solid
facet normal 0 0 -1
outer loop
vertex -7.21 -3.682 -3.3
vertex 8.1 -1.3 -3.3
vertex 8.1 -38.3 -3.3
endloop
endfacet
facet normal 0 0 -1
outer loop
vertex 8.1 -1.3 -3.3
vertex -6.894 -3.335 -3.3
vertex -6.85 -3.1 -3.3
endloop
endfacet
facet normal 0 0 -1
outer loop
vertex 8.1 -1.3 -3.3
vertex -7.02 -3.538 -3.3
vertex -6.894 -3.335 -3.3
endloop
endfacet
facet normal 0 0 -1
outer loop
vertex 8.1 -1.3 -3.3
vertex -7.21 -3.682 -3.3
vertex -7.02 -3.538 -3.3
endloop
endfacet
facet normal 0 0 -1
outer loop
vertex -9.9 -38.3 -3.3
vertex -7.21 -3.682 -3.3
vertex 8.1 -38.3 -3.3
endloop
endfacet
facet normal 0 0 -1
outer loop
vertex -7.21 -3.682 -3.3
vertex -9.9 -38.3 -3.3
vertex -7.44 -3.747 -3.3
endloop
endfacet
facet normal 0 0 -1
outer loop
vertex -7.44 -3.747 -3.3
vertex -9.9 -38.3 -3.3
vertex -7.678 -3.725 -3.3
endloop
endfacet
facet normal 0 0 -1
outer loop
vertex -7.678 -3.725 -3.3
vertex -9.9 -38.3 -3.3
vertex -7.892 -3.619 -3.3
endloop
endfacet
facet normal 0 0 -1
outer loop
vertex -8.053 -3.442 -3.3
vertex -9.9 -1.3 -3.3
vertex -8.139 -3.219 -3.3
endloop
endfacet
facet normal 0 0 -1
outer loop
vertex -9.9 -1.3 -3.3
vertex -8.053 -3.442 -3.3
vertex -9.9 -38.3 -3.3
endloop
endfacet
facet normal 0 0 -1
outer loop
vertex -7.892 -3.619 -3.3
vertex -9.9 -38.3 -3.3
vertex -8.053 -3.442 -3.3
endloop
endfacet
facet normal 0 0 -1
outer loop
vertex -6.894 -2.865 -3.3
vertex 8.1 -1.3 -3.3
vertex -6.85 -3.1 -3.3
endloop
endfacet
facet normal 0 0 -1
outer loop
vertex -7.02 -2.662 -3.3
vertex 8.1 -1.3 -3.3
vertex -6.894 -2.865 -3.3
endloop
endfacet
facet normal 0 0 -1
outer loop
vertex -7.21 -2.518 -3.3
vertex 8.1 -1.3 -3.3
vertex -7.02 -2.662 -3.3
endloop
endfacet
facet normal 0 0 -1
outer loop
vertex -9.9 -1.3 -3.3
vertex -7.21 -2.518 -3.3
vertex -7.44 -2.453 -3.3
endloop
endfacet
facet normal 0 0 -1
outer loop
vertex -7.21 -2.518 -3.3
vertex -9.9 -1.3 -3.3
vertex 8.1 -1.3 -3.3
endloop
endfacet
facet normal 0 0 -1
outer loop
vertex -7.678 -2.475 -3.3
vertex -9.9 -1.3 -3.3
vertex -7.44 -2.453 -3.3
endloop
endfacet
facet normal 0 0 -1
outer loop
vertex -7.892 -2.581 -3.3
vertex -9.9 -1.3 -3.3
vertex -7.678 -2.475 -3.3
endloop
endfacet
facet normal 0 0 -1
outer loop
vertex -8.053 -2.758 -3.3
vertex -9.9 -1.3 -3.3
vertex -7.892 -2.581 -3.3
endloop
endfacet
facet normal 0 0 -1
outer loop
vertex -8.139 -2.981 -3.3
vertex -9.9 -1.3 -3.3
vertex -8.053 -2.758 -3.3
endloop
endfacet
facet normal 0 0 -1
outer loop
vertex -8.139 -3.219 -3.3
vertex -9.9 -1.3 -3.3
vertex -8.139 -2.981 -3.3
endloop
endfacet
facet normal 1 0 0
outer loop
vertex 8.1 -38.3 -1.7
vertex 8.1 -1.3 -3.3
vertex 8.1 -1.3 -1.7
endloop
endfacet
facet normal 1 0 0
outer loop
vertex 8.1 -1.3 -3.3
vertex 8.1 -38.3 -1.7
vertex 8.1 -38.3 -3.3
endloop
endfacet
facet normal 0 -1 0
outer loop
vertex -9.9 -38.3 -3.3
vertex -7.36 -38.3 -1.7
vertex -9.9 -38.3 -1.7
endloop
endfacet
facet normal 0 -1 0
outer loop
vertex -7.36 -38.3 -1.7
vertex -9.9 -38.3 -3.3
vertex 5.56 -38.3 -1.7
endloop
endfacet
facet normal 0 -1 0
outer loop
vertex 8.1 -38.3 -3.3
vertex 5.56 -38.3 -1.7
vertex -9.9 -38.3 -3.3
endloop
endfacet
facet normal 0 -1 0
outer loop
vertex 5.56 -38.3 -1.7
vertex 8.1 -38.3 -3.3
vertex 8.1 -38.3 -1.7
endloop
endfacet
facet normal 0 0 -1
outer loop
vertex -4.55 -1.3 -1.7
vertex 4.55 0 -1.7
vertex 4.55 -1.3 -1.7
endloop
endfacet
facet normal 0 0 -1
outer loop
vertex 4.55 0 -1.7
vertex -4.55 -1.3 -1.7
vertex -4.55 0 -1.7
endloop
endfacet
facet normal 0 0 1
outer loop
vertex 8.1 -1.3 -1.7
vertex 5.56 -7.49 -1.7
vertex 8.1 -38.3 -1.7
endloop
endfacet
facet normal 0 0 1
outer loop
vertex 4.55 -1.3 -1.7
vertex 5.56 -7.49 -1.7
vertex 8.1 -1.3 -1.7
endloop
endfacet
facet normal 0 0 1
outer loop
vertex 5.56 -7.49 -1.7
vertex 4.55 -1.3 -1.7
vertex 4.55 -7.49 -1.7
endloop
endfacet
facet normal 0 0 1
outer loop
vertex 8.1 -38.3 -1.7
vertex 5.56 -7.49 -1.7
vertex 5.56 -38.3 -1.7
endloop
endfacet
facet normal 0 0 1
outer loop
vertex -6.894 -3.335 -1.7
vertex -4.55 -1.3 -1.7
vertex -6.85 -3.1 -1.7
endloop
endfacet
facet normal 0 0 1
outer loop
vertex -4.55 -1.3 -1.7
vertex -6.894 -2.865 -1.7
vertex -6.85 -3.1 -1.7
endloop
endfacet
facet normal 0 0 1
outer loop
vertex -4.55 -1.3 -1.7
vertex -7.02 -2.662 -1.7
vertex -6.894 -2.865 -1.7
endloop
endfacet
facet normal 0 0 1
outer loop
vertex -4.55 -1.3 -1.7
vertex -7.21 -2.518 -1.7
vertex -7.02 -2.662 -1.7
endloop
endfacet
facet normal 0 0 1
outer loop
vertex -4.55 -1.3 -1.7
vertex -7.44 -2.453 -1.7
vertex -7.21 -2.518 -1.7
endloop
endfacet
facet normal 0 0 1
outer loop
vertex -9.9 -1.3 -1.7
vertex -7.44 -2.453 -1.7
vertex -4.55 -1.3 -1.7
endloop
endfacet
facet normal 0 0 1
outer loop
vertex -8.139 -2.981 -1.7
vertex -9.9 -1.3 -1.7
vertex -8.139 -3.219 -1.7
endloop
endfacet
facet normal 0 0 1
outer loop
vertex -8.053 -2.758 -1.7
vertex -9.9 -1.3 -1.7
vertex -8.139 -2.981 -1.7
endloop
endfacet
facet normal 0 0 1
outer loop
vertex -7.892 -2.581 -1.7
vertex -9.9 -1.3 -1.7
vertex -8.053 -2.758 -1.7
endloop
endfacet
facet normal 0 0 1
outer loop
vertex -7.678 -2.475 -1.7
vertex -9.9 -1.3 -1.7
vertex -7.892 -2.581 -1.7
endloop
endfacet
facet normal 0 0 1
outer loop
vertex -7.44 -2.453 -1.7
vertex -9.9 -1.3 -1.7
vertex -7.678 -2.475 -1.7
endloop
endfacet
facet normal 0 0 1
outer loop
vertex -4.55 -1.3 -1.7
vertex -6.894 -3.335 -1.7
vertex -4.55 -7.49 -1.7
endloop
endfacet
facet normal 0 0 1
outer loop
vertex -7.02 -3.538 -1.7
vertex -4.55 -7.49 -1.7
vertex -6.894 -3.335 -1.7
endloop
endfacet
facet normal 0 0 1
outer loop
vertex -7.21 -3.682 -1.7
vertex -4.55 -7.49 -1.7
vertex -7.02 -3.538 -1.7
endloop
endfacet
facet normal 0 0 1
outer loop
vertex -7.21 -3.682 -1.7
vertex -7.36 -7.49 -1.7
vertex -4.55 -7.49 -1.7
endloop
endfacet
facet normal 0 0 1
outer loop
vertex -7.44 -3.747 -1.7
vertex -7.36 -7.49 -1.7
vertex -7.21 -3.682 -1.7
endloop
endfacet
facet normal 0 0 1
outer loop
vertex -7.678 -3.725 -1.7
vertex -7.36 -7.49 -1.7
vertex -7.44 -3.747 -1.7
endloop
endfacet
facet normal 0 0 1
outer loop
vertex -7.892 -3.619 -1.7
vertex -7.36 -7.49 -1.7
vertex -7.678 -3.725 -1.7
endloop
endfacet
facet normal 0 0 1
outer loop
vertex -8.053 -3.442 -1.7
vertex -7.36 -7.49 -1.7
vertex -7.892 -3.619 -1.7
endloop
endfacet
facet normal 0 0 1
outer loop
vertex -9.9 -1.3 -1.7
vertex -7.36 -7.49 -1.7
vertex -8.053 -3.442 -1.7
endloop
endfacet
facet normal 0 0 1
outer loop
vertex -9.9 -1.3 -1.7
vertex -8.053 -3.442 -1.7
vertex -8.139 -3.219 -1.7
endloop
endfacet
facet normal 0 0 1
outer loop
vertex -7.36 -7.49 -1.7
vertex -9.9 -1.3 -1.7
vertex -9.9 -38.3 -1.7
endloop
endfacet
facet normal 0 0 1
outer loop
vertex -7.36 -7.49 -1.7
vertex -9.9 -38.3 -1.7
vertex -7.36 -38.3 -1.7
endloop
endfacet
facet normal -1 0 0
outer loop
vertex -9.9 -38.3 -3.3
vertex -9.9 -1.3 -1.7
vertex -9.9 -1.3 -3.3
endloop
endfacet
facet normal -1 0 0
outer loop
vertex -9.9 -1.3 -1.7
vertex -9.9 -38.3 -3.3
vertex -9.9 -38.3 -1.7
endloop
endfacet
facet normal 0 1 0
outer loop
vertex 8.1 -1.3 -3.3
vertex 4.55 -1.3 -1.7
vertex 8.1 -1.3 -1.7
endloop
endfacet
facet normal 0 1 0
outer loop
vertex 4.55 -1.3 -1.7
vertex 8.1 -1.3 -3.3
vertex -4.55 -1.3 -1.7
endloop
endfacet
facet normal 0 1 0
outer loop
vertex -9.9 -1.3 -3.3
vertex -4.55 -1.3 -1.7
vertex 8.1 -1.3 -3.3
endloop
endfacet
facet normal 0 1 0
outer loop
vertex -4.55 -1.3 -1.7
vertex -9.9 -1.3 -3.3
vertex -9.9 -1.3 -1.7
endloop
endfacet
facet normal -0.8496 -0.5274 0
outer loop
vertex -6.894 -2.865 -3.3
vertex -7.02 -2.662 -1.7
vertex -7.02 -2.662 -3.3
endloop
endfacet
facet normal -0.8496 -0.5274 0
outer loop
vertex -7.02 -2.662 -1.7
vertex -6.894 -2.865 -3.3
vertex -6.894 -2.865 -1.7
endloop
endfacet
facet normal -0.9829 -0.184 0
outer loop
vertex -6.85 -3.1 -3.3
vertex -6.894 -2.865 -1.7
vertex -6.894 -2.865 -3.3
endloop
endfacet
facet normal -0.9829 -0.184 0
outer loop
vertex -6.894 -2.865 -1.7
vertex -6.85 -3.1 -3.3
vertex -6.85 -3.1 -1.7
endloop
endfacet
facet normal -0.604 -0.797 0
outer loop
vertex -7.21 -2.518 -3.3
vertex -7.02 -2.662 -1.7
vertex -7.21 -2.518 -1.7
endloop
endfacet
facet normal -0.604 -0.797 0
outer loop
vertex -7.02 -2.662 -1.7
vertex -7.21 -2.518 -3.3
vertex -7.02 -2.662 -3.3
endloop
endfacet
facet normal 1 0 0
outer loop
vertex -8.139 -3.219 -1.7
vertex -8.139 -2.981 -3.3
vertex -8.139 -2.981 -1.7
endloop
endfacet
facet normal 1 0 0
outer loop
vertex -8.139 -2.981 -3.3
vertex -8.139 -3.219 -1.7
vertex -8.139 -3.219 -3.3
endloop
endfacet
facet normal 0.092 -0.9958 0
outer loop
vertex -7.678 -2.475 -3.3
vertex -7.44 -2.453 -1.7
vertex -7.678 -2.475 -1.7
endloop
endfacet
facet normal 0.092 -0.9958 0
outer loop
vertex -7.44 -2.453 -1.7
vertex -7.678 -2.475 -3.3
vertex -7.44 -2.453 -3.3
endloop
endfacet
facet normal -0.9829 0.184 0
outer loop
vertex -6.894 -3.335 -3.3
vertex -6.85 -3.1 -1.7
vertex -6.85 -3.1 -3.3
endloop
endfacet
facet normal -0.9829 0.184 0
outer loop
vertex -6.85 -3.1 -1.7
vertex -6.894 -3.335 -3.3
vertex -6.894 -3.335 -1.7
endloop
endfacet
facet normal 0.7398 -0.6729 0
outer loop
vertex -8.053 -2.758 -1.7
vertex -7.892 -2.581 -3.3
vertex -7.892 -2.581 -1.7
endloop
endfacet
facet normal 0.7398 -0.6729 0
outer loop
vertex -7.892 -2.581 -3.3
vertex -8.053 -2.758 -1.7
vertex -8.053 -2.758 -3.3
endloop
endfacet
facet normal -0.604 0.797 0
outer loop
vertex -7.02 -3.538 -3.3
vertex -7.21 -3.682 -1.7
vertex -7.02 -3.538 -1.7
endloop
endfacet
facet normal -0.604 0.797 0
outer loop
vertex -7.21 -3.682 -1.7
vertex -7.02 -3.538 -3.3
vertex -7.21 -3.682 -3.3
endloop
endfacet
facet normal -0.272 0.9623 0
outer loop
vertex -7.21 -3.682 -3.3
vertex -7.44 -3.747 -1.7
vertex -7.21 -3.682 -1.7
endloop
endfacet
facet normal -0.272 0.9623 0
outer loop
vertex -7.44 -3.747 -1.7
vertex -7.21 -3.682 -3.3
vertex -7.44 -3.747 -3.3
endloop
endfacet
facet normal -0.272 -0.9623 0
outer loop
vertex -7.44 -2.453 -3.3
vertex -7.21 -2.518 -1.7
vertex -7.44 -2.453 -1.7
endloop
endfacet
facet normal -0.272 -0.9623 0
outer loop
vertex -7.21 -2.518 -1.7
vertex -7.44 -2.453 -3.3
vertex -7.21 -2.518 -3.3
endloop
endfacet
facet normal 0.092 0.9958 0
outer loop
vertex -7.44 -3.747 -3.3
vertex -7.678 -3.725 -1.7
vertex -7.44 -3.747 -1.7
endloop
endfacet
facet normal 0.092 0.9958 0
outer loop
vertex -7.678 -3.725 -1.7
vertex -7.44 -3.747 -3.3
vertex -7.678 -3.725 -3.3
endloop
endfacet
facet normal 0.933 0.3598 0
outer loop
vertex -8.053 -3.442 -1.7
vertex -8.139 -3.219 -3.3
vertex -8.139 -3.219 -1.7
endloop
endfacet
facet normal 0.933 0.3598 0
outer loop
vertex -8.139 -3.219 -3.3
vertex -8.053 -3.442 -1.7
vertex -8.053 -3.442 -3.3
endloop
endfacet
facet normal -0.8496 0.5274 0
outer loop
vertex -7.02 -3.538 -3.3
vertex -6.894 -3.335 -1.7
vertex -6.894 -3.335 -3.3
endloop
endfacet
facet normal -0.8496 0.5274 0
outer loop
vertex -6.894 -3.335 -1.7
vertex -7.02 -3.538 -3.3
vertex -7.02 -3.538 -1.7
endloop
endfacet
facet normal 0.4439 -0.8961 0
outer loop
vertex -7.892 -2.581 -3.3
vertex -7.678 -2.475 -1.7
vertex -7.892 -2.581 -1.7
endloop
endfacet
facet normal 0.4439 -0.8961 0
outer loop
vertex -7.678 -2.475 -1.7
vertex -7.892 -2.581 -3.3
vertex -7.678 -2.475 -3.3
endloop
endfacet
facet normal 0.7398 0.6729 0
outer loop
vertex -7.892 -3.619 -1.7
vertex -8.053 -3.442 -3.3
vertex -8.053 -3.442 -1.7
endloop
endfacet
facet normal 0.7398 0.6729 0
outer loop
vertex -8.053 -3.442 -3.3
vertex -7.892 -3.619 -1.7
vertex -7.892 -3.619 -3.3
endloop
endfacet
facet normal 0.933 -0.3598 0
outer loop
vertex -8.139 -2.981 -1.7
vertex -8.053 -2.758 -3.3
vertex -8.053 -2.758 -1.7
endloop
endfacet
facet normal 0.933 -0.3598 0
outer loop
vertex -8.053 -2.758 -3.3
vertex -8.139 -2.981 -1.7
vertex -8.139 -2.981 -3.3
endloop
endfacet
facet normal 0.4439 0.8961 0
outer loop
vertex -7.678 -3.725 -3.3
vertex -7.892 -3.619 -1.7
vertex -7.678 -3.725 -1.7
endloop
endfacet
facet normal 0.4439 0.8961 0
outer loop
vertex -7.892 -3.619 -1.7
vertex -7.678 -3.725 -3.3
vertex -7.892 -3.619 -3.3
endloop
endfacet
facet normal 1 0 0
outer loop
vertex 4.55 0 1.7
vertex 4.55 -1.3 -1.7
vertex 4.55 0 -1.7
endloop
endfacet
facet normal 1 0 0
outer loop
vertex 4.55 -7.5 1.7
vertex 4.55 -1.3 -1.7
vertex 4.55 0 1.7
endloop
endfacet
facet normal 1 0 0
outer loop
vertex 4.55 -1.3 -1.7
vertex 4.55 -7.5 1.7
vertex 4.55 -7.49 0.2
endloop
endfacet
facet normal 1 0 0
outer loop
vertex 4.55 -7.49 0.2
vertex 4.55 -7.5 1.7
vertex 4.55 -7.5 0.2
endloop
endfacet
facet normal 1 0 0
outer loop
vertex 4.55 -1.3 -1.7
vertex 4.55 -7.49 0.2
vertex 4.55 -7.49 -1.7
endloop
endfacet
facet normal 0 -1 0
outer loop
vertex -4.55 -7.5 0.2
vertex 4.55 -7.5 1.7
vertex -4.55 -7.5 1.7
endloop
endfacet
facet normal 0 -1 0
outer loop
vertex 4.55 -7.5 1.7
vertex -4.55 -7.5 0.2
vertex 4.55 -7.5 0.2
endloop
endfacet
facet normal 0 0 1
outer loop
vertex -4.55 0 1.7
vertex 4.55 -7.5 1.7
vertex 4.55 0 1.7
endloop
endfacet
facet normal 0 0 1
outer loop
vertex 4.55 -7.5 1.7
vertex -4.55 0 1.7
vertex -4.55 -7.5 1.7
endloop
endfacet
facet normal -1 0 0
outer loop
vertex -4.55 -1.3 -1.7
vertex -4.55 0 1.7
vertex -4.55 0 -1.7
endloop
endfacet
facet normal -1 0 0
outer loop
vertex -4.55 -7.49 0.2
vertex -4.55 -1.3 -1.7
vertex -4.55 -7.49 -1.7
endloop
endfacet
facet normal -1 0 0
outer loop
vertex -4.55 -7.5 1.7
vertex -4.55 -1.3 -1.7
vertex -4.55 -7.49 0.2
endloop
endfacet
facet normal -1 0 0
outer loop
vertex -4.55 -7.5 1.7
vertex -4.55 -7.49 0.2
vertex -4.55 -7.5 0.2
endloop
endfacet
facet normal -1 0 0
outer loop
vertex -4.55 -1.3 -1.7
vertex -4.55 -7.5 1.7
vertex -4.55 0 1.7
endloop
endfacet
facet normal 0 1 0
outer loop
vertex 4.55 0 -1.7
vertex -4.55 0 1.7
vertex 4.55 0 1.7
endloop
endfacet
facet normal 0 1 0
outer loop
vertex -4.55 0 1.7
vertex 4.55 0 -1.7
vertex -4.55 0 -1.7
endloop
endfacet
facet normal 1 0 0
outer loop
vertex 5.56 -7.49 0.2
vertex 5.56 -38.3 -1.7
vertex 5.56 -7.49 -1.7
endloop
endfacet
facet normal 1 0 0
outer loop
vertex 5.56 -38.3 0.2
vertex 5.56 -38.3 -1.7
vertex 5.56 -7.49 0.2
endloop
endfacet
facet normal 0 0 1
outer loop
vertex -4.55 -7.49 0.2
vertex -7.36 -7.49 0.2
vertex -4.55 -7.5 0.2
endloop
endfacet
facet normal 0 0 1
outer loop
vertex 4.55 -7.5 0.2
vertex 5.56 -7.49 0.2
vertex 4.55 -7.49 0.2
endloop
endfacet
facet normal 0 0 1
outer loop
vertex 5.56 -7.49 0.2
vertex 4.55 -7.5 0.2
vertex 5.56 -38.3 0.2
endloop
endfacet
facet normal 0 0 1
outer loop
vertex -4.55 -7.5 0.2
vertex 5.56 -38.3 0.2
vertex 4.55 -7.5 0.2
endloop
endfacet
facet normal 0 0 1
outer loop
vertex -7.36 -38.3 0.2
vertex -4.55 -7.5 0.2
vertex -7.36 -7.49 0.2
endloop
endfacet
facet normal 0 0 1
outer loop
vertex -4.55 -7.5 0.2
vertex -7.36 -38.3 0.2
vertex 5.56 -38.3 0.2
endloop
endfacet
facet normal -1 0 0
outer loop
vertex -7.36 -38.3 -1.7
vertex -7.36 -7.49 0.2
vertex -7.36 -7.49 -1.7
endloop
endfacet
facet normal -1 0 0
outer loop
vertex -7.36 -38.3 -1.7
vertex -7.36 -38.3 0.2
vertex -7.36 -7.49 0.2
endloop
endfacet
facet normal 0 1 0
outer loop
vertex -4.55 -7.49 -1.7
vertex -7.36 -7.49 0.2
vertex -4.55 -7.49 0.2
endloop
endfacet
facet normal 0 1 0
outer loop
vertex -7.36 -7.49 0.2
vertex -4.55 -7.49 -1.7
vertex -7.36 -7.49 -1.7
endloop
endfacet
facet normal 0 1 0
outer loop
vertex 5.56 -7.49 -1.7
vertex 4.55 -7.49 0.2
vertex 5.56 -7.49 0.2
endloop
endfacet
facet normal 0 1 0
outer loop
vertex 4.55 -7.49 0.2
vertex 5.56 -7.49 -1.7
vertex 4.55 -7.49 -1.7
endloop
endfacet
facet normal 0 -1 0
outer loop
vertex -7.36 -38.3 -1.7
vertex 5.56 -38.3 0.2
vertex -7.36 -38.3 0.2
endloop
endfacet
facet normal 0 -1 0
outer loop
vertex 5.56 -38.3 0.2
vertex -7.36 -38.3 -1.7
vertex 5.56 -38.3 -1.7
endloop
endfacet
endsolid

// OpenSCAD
// ### Usage #########################################################

$fa = $preview ? 20 : 1;    // minimum angle for a fragment
$fs = $preview ? 1 : 0.25;  // minimum size of a fragment

pro_micro_c();

// ### Module ########################################################

eps = 0.01;
width = 18;
length = 37;
height = 3.5; // Height including components (excluding USB connector)
height_pcb = 1.6;
width_usbc = 9.1;
length_usbc = 7.5;
height_usbc = 3.4;
offset_usbc_y = 1.3; // Amount USB-C sticks off end of PCB
offset_usbc_x = 0.9; // Amount USB-C is shifted from center (right positive)
pin_header_width = 2.54;

mount_x = -7.5; // Mount hole (if present) relative to center of USB interface plane
mount_y = -3.1; // Mount hole (if present) relative to center of USB interface plane
mount_d = 1.3;

module pro_micro_c(mount = true) {
  
  // USB-C connector
  color("Silver")
  pro_micro_usbc();

  // PCB
  difference() {
    color("Teal")
    pro_micro_pcb();

    if (mount == true)
    translate([mount_x, mount_y, 0])
    cylinder(h = 3*height_usbc, d = mount_d, center = true);
  }

  // PCB components (clearance)
  comp_width = width - 2*pin_header_width;
  comp_length = length - length_usbc + offset_usbc_y;
  color("DimGray")
  translate([-comp_width/2 - offset_usbc_x, -comp_length - length_usbc, -height_usbc/2])
  cube([comp_width, comp_length + eps, height - height_pcb]);
}

module pro_micro_pcb(offset_xy = 0) {
  translate([0, 0, -height_pcb - height_usbc/2])
  linear_extrude(height = height_pcb)
  offset(delta = offset_xy)
  translate([-width/2 - offset_usbc_x, -length - offset_usbc_y])
  square([width, length]);
}

module pro_micro_usbc(offset_xy = 0) {
  linear_extrude(height = height_usbc, center = true)
  offset(delta = offset_xy)
  translate([0, -length_usbc / 2])
  square([width_usbc, length_usbc], center = true);
}
